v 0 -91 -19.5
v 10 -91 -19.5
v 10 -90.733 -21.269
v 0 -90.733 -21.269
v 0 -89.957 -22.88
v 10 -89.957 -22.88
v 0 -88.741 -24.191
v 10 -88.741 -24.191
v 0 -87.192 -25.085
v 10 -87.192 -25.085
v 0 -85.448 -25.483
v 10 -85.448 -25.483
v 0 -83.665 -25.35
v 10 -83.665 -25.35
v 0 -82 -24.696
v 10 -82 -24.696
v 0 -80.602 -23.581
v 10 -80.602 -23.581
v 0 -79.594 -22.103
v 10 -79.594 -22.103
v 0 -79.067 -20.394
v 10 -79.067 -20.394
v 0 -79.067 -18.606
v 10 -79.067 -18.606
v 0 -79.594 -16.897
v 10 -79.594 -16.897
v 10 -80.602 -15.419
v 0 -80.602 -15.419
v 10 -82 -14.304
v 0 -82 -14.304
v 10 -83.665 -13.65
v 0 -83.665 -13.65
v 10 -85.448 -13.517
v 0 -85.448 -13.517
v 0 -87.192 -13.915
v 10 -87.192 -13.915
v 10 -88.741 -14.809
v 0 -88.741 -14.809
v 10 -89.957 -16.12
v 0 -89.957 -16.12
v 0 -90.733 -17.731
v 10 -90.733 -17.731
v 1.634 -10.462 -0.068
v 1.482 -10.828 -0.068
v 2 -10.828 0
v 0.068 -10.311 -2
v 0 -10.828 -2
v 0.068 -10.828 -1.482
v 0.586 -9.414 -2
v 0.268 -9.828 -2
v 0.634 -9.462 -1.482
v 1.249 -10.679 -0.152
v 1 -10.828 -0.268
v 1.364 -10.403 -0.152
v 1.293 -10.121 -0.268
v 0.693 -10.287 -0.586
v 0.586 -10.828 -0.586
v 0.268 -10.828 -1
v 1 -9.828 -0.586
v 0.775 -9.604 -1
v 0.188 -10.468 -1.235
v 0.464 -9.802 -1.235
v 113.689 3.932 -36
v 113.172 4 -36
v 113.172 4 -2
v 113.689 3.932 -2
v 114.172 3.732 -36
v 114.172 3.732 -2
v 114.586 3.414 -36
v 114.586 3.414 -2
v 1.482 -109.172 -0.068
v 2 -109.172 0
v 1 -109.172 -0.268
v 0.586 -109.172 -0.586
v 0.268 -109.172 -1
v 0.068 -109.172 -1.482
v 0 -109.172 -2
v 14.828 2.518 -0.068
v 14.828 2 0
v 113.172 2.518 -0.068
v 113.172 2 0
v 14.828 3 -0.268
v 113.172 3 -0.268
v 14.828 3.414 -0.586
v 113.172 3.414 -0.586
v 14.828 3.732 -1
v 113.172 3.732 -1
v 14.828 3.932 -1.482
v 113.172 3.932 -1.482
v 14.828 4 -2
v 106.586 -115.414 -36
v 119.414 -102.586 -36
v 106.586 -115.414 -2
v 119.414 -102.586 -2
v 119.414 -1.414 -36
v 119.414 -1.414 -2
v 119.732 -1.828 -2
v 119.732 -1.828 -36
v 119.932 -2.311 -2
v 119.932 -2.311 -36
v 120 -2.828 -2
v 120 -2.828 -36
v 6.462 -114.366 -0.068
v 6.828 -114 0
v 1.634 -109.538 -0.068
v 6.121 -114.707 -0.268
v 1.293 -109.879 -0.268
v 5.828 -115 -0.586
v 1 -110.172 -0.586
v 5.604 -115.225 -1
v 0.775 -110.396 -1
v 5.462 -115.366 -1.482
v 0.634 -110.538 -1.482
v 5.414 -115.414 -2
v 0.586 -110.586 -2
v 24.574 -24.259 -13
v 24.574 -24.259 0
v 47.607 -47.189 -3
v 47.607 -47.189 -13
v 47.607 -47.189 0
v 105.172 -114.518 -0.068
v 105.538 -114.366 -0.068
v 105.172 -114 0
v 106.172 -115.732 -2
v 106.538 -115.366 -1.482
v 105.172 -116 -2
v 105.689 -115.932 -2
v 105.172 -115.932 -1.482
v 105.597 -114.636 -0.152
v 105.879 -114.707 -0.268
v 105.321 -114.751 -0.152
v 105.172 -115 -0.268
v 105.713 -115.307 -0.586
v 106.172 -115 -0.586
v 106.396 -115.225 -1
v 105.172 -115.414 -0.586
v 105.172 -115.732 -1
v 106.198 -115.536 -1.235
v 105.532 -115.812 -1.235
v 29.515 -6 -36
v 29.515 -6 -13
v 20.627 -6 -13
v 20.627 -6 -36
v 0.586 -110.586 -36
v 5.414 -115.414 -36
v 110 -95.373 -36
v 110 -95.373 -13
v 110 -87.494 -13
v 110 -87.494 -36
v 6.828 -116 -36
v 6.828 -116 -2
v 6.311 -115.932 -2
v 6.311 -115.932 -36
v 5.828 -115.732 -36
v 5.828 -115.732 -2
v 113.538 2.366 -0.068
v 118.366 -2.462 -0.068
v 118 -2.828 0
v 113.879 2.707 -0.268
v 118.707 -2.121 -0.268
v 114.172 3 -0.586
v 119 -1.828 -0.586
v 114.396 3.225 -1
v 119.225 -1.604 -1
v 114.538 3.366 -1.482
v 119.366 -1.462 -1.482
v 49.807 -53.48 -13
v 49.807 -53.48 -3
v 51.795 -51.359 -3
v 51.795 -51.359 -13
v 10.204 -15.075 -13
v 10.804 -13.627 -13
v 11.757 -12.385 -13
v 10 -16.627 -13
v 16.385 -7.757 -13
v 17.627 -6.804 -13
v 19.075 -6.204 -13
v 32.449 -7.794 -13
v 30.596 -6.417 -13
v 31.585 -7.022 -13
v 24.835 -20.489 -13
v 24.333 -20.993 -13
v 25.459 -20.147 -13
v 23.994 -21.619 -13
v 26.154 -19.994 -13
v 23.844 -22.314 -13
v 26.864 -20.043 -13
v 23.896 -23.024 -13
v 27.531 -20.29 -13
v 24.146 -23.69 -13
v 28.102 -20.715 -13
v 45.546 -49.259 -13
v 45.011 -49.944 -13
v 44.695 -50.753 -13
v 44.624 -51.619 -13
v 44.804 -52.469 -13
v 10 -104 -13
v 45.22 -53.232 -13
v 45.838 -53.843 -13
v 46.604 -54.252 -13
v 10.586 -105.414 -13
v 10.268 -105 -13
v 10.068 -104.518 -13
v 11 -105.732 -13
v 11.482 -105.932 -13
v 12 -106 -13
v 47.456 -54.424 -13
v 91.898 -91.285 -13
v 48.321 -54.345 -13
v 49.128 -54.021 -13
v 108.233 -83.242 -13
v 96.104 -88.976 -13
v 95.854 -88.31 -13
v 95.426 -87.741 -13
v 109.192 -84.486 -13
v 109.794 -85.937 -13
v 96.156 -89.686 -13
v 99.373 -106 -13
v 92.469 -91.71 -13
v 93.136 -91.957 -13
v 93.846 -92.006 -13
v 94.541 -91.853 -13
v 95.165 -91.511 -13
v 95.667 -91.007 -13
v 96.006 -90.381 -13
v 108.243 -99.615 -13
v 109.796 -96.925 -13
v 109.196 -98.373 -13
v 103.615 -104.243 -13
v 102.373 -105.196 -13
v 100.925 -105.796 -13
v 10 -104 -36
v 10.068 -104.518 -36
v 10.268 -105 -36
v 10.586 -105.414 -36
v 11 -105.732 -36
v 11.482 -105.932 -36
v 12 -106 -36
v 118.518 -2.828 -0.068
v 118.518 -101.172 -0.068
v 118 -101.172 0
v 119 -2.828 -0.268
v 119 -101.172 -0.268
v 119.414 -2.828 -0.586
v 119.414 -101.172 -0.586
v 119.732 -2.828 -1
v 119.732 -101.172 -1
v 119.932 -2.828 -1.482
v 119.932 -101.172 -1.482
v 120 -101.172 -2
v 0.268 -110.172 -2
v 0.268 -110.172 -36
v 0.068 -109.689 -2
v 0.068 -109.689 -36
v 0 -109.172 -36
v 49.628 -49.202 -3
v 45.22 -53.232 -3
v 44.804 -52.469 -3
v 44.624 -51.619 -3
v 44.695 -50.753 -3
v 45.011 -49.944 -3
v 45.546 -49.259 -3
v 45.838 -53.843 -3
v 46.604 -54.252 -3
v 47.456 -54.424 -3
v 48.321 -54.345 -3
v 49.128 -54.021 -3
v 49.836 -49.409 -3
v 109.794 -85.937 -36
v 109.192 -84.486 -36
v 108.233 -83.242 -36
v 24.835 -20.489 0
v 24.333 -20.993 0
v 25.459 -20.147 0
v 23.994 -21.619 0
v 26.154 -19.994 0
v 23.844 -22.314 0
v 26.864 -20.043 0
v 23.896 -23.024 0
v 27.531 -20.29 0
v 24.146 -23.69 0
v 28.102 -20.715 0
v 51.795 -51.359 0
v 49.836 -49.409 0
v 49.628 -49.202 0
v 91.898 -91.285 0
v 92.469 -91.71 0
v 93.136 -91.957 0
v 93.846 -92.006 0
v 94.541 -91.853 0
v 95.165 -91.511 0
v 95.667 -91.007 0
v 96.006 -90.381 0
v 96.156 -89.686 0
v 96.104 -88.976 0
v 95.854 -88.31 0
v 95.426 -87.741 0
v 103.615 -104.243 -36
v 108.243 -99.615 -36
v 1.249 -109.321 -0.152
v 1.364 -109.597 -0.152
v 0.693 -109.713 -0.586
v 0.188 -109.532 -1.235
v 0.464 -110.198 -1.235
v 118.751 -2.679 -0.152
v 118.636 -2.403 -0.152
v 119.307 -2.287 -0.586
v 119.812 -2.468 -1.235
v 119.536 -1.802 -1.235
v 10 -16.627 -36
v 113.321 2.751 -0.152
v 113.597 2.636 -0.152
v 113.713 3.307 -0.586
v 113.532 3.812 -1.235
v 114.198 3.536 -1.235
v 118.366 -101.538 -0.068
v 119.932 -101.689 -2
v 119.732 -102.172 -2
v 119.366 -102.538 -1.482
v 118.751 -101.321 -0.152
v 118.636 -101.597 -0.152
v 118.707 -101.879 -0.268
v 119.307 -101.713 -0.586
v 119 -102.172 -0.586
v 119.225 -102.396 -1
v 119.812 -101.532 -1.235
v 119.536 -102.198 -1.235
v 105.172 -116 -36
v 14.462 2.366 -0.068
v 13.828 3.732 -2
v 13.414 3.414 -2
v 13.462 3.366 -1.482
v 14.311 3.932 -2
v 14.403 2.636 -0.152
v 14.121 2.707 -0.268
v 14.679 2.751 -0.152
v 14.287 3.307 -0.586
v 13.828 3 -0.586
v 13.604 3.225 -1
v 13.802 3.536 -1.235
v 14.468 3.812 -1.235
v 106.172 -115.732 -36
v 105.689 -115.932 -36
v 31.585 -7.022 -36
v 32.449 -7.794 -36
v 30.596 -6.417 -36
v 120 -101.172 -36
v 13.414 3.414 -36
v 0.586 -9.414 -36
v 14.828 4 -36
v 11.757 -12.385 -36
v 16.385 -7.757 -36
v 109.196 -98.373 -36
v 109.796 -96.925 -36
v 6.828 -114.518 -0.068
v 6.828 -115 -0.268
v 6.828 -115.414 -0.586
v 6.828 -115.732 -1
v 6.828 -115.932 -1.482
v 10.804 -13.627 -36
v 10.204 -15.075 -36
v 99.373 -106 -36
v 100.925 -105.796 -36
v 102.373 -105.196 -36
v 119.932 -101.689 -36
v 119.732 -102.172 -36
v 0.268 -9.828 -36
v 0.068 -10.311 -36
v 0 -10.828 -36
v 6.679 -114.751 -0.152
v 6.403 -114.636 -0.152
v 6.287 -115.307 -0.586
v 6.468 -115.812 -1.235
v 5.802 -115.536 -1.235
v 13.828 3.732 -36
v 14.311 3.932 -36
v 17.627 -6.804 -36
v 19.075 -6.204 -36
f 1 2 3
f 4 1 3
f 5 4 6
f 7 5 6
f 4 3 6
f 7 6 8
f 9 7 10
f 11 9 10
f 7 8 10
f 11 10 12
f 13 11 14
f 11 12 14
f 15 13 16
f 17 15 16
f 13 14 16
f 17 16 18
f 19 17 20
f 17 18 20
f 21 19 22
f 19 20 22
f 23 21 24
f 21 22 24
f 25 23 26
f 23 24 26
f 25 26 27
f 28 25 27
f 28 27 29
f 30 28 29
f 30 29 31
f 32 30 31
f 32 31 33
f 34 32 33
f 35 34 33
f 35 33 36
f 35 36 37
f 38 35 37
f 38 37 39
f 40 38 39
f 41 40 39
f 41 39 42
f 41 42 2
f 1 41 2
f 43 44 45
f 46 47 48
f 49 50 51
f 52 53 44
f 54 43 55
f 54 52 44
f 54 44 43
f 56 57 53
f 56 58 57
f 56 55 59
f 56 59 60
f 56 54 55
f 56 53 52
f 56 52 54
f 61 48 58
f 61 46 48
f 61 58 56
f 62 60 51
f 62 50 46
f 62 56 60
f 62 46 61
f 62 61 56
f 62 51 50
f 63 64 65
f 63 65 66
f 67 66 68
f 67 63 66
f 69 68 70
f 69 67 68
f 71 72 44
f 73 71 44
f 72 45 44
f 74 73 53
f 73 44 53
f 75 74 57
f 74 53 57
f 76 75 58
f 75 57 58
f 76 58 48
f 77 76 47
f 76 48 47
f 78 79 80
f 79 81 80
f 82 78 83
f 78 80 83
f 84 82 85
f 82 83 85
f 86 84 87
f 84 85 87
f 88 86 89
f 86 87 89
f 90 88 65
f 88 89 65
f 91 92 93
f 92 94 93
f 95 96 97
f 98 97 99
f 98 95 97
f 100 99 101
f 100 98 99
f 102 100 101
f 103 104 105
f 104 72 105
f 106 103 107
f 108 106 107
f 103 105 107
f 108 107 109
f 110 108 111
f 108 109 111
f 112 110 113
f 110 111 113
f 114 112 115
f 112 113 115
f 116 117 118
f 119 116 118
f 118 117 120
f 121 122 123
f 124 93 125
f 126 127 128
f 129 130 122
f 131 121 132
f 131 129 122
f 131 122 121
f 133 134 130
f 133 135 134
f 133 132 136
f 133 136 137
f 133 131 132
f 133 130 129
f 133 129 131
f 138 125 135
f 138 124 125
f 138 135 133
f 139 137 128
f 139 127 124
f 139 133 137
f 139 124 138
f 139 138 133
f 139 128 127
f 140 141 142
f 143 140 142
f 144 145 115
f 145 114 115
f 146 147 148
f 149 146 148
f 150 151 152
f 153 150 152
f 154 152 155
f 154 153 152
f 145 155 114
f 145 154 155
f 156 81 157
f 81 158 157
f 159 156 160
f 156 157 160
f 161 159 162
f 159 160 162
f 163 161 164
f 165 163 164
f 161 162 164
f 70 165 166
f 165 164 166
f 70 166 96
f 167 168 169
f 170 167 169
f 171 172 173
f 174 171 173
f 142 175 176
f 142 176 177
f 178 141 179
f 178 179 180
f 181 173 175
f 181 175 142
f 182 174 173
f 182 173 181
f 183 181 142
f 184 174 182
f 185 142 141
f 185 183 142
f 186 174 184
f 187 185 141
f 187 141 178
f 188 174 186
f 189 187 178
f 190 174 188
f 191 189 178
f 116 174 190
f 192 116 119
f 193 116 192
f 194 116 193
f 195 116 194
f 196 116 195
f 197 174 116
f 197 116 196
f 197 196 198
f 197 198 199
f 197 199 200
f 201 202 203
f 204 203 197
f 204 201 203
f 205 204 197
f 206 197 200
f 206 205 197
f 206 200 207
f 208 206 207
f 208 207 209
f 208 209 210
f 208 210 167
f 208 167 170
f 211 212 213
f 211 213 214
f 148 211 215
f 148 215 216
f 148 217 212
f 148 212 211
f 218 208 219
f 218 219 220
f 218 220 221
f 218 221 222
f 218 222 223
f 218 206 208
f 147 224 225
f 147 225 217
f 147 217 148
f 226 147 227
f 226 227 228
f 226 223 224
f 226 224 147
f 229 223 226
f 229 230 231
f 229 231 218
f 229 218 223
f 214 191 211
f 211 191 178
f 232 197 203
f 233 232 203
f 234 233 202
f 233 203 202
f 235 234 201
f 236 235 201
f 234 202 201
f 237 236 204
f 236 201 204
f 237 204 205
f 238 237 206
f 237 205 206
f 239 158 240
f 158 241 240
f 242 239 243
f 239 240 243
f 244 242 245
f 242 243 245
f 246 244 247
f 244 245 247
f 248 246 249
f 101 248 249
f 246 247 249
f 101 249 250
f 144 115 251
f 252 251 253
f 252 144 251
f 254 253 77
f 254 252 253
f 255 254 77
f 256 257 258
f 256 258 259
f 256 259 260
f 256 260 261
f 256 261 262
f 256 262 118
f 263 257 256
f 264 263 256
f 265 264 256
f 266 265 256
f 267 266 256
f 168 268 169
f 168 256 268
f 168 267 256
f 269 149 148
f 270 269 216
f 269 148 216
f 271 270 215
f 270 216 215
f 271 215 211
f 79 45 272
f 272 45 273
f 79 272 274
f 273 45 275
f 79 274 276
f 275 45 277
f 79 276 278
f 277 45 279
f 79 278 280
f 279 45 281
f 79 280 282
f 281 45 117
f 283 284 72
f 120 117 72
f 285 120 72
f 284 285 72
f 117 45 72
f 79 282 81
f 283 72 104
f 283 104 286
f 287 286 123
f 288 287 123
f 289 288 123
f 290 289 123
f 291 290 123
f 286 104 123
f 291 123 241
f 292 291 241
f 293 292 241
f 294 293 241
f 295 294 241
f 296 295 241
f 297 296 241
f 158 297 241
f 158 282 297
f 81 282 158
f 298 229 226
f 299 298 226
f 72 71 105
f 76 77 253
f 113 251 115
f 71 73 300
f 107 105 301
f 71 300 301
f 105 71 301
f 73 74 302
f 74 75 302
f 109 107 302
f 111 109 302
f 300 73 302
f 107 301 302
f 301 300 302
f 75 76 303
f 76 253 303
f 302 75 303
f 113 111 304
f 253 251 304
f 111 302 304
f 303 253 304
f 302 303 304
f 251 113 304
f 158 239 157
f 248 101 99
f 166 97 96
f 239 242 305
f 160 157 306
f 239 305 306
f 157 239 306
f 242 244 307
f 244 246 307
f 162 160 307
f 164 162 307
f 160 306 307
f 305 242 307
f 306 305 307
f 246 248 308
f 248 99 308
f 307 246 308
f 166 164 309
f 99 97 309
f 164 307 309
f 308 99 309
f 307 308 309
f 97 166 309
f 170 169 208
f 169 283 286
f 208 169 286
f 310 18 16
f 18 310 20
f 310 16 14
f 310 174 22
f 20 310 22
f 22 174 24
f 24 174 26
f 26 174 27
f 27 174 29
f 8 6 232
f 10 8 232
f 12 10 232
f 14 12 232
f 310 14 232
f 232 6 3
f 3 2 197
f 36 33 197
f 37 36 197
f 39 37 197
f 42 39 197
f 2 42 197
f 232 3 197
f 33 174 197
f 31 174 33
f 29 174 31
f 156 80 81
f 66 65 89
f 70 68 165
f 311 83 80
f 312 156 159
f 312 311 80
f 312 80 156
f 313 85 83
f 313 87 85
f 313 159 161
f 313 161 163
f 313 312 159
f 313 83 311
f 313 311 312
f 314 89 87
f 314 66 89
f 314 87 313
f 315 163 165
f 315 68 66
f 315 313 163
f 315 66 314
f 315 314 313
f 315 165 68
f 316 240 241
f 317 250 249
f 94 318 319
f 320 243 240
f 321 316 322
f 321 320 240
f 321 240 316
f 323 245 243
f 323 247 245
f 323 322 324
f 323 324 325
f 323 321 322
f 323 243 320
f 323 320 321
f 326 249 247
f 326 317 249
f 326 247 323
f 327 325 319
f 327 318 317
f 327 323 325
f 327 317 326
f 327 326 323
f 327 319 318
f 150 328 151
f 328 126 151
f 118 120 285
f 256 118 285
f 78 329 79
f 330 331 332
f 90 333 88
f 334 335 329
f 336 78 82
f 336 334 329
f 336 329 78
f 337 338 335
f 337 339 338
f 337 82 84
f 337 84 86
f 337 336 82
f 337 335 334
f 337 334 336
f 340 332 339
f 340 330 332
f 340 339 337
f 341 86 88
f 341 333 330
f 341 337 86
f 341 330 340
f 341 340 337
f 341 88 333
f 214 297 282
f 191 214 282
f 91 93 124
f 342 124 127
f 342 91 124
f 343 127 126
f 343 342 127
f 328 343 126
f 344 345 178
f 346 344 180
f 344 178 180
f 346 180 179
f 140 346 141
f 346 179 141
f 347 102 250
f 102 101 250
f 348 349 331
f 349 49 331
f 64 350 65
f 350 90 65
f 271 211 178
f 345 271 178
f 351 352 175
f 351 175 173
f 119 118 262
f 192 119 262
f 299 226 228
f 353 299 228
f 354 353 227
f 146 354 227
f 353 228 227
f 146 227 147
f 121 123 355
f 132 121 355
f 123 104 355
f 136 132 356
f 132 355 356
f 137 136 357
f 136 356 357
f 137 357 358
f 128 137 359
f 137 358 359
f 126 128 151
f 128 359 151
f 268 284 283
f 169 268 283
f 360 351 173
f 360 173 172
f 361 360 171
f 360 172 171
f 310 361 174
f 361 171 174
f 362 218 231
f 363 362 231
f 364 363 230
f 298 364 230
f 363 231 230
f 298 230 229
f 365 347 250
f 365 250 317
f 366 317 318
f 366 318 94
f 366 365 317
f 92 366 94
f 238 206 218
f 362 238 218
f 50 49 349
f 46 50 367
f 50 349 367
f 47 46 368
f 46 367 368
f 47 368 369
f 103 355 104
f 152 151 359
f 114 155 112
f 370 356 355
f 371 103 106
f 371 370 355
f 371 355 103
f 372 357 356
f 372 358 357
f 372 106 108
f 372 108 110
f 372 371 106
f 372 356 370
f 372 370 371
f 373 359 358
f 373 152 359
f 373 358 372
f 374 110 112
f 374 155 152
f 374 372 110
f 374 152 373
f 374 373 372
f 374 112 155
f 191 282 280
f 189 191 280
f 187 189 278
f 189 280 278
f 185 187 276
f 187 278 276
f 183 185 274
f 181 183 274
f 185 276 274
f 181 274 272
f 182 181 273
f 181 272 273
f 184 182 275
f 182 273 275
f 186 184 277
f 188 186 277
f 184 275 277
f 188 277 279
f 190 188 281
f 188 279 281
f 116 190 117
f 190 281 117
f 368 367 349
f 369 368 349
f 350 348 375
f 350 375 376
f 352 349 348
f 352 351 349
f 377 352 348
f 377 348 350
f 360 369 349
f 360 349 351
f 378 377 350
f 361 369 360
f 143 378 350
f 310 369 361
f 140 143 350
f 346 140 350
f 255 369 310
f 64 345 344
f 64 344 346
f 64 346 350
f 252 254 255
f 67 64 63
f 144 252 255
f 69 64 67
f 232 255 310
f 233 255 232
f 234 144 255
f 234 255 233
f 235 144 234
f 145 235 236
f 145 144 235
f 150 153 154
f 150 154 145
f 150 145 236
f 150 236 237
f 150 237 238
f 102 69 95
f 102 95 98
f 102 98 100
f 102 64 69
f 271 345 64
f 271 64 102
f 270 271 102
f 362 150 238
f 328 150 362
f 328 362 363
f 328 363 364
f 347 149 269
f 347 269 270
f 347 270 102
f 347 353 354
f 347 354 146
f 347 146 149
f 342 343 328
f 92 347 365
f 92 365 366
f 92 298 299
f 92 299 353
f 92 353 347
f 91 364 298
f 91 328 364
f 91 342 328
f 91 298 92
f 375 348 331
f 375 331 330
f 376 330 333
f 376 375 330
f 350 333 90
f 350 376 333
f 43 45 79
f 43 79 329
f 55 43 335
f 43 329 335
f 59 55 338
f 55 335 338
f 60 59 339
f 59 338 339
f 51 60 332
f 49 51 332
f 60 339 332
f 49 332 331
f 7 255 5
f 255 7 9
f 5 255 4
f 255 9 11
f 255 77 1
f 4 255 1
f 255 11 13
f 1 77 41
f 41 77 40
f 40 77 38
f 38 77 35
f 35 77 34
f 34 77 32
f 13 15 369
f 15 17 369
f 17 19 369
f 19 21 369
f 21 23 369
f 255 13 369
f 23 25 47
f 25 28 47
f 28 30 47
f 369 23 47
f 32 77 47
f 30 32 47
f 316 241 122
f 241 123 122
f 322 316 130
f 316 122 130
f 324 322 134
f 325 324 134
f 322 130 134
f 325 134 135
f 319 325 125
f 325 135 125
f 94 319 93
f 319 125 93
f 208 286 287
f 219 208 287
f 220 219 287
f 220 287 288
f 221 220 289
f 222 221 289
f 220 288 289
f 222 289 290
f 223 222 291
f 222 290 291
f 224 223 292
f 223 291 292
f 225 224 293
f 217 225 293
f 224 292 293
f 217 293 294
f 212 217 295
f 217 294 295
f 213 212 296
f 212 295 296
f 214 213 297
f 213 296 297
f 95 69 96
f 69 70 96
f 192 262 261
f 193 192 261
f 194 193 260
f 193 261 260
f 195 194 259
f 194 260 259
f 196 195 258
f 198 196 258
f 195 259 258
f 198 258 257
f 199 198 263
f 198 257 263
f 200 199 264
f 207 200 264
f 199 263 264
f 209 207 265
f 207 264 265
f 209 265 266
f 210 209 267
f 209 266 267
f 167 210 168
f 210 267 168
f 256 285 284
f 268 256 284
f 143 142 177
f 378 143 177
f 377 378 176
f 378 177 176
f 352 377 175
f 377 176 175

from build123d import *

# Parameters (mm, degrees)
F1_DEPTH = 13
F2_DEPTH = 36
F3_DEPTH = 3
F4_R     = 2
F6_D     = 12
F6_DEPTH = 12
F6_TIP   = 3.6051637142
F7_ANGLE = 180


with BuildPart() as f1:
    # F0 (on Top) → F1 (new body)
    with BuildSketch(Plane.XY):
        with BuildLine():
            ThreePointArc((29.5146428337, 10), (31.1042871443, 10.6969432761), (32.4494111737, 11.7939119674))
            Line((32.4494111737, 11.7939119674), (108.2332133573, 87.2420420008))
            ThreePointArc((108.2332133573, 87.2420420008), (109.5407255907, 89.1918380595), (110, 91.4940891162))
            Line((110, 91.4940891162), (110, 99.372583002))
            ThreePointArc((110, 99.372583002), (109.5432771951, 101.6686835962), (108.2426406871, 103.6152236891))
            Line((108.2426406871, 103.6152236891), (103.6152236891, 108.2426406871))
            ThreePointArc((103.6152236891, 108.2426406871), (101.6686835962, 109.5432771951), (99.372583002, 110))
            Line((99.372583002, 110), (12, 110))
            ThreePointArc((12, 110), (10.5857864376, 109.4142135624), (10, 108))
            Line((10, 108), (10, 20.627416998))
            ThreePointArc((10, 20.627416998), (10.4567228049, 18.3313164038), (11.7573593129, 16.3847763109))
            Line((11.7573593129, 16.3847763109), (16.3847763109, 11.7573593129))
            ThreePointArc((16.3847763109, 11.7573593129), (18.3313164038, 10.4567228049), (20.627416998, 10))
            Line((20.627416998, 10), (29.5146428337, 10))
        make_face()
        with BuildLine():
            ThreePointArc((91.8982009854, 95.2846255964), (95.433726402, 95.2767779765), (95.4258783418, 91.7412525609))
            Line((95.4258783418, 91.7412525609), (28.1017990146, 24.7153744036))
            ThreePointArc((28.1017990146, 24.7153744036), (24.5662740393, 24.7232224629), (24.5741216582, 28.2587474391))
            Line((24.5741216582, 28.2587474391), (47.6067560594, 51.1893624946))
            Line((47.6067560594, 51.1893624946), (45.5464457109, 53.2588392572))
            ThreePointArc((45.5464457109, 53.2588392572), (45.506735129, 57.5600725399), (49.8074020179, 57.4797669158))
            Line((49.8074020179, 57.4797669158), (51.794521287, 55.3585786904))
            Line((51.794521287, 55.3585786904), (91.8982009854, 95.2846255964))
        make_face(mode=Mode.SUBTRACT)
    extrude(amount=F1_DEPTH)

    # F0 (on Top) → F2 (join)
    with BuildSketch(Plane.XY):
        Polygon((0, 14), (14, 0), (114, 0), (120, 6), (120, 106), (106, 120), (6, 120), (0, 114), align=None)
        with BuildLine():
            Line((108.2332133573, 87.2420420008), (32.4494111737, 11.7939119674))
            ThreePointArc((32.4494111737, 11.7939119674), (31.1042871443, 10.6969432761), (29.5146428337, 10))
            Line((29.5146428337, 10), (20.627416998, 10))
            ThreePointArc((20.627416998, 10), (18.3313164038, 10.4567228049), (16.3847763109, 11.7573593129))
            Line((16.3847763109, 11.7573593129), (11.7573593129, 16.3847763109))
            ThreePointArc((11.7573593129, 16.3847763109), (10.4567228049, 18.3313164038), (10, 20.627416998))
            Line((10, 20.627416998), (10, 108))
            ThreePointArc((10, 108), (10.5857864376, 109.4142135624), (12, 110))
            Line((12, 110), (99.372583002, 110))
            ThreePointArc((99.372583002, 110), (101.6686835962, 109.5432771951), (103.6152236891, 108.2426406871))
            Line((103.6152236891, 108.2426406871), (108.2426406871, 103.6152236891))
            ThreePointArc((108.2426406871, 103.6152236891), (109.5432771951, 101.6686835962), (110, 99.372583002))
            Line((110, 99.372583002), (110, 91.4940891162))
            ThreePointArc((110, 91.4940891162), (109.5407255907, 89.1918380595), (108.2332133573, 87.2420420008))
        make_face(mode=Mode.SUBTRACT)
    extrude(amount=F2_DEPTH)

    # F0 (on Top) → F3 (join)
    with BuildSketch(Plane.XY):
        with BuildLine():
            Line((49.8360901626, 53.4088221213), (51.794521287, 55.3585786904))
            Line((51.794521287, 55.3585786904), (49.8074020179, 57.4797669158))
            ThreePointArc((49.8074020179, 57.4797669158), (45.506735129, 57.5600725399), (45.5464457109, 53.2588392572))
            Line((45.5464457109, 53.2588392572), (47.6067560594, 51.1893624946))
            Line((47.6067560594, 51.1893624946), (49.6280971878, 53.201750418))
            Line((49.6280971878, 53.201750418), (49.8360901626, 53.4088221213))
        make_face()
    extrude(amount=F3_DEPTH)

    # F4
    f4_edges = [f1.edges().sort_by_distance(p)[0] for p in [
        (56, 120, 0),
        (106, 120, 18),
        (120, 106, 18),
        (120, 56, 0),
        (113, 113, 0),
        (117, 3, 0),
        (114, 0, 18),
        (120, 6, 18),
        (64, 0, 0),
        (14, 0, 18),
        (7, 7, 0),
        (0, 14, 18),
        (0, 64, 0),
        (3, 117, 0),
        (0, 114, 18),
        (6, 120, 18),
    ]]
    fillet(f4_edges, radius=F4_R)

    # F6
    with Locations(Plane(origin=(0, 0, 0), x_dir=(0, -1, 0), z_dir=(-1, 0, 0))):
        with Locations((-89, 19.5)):
            Hole(F6_D / 2, depth=F6_DEPTH)
            with Locations((0, 0, -(F6_DEPTH + F6_TIP / 2))):  # 118° drill point
                Cone(0, F6_D / 2, F6_TIP, mode=Mode.SUBTRACT)


with BuildPart() as f1_1:
    # F7: moved
    add(f1.part.rotate(Axis((64, 2, 0), (-1, 0, 0)), F7_ANGLE))


solid = f1_1.part
